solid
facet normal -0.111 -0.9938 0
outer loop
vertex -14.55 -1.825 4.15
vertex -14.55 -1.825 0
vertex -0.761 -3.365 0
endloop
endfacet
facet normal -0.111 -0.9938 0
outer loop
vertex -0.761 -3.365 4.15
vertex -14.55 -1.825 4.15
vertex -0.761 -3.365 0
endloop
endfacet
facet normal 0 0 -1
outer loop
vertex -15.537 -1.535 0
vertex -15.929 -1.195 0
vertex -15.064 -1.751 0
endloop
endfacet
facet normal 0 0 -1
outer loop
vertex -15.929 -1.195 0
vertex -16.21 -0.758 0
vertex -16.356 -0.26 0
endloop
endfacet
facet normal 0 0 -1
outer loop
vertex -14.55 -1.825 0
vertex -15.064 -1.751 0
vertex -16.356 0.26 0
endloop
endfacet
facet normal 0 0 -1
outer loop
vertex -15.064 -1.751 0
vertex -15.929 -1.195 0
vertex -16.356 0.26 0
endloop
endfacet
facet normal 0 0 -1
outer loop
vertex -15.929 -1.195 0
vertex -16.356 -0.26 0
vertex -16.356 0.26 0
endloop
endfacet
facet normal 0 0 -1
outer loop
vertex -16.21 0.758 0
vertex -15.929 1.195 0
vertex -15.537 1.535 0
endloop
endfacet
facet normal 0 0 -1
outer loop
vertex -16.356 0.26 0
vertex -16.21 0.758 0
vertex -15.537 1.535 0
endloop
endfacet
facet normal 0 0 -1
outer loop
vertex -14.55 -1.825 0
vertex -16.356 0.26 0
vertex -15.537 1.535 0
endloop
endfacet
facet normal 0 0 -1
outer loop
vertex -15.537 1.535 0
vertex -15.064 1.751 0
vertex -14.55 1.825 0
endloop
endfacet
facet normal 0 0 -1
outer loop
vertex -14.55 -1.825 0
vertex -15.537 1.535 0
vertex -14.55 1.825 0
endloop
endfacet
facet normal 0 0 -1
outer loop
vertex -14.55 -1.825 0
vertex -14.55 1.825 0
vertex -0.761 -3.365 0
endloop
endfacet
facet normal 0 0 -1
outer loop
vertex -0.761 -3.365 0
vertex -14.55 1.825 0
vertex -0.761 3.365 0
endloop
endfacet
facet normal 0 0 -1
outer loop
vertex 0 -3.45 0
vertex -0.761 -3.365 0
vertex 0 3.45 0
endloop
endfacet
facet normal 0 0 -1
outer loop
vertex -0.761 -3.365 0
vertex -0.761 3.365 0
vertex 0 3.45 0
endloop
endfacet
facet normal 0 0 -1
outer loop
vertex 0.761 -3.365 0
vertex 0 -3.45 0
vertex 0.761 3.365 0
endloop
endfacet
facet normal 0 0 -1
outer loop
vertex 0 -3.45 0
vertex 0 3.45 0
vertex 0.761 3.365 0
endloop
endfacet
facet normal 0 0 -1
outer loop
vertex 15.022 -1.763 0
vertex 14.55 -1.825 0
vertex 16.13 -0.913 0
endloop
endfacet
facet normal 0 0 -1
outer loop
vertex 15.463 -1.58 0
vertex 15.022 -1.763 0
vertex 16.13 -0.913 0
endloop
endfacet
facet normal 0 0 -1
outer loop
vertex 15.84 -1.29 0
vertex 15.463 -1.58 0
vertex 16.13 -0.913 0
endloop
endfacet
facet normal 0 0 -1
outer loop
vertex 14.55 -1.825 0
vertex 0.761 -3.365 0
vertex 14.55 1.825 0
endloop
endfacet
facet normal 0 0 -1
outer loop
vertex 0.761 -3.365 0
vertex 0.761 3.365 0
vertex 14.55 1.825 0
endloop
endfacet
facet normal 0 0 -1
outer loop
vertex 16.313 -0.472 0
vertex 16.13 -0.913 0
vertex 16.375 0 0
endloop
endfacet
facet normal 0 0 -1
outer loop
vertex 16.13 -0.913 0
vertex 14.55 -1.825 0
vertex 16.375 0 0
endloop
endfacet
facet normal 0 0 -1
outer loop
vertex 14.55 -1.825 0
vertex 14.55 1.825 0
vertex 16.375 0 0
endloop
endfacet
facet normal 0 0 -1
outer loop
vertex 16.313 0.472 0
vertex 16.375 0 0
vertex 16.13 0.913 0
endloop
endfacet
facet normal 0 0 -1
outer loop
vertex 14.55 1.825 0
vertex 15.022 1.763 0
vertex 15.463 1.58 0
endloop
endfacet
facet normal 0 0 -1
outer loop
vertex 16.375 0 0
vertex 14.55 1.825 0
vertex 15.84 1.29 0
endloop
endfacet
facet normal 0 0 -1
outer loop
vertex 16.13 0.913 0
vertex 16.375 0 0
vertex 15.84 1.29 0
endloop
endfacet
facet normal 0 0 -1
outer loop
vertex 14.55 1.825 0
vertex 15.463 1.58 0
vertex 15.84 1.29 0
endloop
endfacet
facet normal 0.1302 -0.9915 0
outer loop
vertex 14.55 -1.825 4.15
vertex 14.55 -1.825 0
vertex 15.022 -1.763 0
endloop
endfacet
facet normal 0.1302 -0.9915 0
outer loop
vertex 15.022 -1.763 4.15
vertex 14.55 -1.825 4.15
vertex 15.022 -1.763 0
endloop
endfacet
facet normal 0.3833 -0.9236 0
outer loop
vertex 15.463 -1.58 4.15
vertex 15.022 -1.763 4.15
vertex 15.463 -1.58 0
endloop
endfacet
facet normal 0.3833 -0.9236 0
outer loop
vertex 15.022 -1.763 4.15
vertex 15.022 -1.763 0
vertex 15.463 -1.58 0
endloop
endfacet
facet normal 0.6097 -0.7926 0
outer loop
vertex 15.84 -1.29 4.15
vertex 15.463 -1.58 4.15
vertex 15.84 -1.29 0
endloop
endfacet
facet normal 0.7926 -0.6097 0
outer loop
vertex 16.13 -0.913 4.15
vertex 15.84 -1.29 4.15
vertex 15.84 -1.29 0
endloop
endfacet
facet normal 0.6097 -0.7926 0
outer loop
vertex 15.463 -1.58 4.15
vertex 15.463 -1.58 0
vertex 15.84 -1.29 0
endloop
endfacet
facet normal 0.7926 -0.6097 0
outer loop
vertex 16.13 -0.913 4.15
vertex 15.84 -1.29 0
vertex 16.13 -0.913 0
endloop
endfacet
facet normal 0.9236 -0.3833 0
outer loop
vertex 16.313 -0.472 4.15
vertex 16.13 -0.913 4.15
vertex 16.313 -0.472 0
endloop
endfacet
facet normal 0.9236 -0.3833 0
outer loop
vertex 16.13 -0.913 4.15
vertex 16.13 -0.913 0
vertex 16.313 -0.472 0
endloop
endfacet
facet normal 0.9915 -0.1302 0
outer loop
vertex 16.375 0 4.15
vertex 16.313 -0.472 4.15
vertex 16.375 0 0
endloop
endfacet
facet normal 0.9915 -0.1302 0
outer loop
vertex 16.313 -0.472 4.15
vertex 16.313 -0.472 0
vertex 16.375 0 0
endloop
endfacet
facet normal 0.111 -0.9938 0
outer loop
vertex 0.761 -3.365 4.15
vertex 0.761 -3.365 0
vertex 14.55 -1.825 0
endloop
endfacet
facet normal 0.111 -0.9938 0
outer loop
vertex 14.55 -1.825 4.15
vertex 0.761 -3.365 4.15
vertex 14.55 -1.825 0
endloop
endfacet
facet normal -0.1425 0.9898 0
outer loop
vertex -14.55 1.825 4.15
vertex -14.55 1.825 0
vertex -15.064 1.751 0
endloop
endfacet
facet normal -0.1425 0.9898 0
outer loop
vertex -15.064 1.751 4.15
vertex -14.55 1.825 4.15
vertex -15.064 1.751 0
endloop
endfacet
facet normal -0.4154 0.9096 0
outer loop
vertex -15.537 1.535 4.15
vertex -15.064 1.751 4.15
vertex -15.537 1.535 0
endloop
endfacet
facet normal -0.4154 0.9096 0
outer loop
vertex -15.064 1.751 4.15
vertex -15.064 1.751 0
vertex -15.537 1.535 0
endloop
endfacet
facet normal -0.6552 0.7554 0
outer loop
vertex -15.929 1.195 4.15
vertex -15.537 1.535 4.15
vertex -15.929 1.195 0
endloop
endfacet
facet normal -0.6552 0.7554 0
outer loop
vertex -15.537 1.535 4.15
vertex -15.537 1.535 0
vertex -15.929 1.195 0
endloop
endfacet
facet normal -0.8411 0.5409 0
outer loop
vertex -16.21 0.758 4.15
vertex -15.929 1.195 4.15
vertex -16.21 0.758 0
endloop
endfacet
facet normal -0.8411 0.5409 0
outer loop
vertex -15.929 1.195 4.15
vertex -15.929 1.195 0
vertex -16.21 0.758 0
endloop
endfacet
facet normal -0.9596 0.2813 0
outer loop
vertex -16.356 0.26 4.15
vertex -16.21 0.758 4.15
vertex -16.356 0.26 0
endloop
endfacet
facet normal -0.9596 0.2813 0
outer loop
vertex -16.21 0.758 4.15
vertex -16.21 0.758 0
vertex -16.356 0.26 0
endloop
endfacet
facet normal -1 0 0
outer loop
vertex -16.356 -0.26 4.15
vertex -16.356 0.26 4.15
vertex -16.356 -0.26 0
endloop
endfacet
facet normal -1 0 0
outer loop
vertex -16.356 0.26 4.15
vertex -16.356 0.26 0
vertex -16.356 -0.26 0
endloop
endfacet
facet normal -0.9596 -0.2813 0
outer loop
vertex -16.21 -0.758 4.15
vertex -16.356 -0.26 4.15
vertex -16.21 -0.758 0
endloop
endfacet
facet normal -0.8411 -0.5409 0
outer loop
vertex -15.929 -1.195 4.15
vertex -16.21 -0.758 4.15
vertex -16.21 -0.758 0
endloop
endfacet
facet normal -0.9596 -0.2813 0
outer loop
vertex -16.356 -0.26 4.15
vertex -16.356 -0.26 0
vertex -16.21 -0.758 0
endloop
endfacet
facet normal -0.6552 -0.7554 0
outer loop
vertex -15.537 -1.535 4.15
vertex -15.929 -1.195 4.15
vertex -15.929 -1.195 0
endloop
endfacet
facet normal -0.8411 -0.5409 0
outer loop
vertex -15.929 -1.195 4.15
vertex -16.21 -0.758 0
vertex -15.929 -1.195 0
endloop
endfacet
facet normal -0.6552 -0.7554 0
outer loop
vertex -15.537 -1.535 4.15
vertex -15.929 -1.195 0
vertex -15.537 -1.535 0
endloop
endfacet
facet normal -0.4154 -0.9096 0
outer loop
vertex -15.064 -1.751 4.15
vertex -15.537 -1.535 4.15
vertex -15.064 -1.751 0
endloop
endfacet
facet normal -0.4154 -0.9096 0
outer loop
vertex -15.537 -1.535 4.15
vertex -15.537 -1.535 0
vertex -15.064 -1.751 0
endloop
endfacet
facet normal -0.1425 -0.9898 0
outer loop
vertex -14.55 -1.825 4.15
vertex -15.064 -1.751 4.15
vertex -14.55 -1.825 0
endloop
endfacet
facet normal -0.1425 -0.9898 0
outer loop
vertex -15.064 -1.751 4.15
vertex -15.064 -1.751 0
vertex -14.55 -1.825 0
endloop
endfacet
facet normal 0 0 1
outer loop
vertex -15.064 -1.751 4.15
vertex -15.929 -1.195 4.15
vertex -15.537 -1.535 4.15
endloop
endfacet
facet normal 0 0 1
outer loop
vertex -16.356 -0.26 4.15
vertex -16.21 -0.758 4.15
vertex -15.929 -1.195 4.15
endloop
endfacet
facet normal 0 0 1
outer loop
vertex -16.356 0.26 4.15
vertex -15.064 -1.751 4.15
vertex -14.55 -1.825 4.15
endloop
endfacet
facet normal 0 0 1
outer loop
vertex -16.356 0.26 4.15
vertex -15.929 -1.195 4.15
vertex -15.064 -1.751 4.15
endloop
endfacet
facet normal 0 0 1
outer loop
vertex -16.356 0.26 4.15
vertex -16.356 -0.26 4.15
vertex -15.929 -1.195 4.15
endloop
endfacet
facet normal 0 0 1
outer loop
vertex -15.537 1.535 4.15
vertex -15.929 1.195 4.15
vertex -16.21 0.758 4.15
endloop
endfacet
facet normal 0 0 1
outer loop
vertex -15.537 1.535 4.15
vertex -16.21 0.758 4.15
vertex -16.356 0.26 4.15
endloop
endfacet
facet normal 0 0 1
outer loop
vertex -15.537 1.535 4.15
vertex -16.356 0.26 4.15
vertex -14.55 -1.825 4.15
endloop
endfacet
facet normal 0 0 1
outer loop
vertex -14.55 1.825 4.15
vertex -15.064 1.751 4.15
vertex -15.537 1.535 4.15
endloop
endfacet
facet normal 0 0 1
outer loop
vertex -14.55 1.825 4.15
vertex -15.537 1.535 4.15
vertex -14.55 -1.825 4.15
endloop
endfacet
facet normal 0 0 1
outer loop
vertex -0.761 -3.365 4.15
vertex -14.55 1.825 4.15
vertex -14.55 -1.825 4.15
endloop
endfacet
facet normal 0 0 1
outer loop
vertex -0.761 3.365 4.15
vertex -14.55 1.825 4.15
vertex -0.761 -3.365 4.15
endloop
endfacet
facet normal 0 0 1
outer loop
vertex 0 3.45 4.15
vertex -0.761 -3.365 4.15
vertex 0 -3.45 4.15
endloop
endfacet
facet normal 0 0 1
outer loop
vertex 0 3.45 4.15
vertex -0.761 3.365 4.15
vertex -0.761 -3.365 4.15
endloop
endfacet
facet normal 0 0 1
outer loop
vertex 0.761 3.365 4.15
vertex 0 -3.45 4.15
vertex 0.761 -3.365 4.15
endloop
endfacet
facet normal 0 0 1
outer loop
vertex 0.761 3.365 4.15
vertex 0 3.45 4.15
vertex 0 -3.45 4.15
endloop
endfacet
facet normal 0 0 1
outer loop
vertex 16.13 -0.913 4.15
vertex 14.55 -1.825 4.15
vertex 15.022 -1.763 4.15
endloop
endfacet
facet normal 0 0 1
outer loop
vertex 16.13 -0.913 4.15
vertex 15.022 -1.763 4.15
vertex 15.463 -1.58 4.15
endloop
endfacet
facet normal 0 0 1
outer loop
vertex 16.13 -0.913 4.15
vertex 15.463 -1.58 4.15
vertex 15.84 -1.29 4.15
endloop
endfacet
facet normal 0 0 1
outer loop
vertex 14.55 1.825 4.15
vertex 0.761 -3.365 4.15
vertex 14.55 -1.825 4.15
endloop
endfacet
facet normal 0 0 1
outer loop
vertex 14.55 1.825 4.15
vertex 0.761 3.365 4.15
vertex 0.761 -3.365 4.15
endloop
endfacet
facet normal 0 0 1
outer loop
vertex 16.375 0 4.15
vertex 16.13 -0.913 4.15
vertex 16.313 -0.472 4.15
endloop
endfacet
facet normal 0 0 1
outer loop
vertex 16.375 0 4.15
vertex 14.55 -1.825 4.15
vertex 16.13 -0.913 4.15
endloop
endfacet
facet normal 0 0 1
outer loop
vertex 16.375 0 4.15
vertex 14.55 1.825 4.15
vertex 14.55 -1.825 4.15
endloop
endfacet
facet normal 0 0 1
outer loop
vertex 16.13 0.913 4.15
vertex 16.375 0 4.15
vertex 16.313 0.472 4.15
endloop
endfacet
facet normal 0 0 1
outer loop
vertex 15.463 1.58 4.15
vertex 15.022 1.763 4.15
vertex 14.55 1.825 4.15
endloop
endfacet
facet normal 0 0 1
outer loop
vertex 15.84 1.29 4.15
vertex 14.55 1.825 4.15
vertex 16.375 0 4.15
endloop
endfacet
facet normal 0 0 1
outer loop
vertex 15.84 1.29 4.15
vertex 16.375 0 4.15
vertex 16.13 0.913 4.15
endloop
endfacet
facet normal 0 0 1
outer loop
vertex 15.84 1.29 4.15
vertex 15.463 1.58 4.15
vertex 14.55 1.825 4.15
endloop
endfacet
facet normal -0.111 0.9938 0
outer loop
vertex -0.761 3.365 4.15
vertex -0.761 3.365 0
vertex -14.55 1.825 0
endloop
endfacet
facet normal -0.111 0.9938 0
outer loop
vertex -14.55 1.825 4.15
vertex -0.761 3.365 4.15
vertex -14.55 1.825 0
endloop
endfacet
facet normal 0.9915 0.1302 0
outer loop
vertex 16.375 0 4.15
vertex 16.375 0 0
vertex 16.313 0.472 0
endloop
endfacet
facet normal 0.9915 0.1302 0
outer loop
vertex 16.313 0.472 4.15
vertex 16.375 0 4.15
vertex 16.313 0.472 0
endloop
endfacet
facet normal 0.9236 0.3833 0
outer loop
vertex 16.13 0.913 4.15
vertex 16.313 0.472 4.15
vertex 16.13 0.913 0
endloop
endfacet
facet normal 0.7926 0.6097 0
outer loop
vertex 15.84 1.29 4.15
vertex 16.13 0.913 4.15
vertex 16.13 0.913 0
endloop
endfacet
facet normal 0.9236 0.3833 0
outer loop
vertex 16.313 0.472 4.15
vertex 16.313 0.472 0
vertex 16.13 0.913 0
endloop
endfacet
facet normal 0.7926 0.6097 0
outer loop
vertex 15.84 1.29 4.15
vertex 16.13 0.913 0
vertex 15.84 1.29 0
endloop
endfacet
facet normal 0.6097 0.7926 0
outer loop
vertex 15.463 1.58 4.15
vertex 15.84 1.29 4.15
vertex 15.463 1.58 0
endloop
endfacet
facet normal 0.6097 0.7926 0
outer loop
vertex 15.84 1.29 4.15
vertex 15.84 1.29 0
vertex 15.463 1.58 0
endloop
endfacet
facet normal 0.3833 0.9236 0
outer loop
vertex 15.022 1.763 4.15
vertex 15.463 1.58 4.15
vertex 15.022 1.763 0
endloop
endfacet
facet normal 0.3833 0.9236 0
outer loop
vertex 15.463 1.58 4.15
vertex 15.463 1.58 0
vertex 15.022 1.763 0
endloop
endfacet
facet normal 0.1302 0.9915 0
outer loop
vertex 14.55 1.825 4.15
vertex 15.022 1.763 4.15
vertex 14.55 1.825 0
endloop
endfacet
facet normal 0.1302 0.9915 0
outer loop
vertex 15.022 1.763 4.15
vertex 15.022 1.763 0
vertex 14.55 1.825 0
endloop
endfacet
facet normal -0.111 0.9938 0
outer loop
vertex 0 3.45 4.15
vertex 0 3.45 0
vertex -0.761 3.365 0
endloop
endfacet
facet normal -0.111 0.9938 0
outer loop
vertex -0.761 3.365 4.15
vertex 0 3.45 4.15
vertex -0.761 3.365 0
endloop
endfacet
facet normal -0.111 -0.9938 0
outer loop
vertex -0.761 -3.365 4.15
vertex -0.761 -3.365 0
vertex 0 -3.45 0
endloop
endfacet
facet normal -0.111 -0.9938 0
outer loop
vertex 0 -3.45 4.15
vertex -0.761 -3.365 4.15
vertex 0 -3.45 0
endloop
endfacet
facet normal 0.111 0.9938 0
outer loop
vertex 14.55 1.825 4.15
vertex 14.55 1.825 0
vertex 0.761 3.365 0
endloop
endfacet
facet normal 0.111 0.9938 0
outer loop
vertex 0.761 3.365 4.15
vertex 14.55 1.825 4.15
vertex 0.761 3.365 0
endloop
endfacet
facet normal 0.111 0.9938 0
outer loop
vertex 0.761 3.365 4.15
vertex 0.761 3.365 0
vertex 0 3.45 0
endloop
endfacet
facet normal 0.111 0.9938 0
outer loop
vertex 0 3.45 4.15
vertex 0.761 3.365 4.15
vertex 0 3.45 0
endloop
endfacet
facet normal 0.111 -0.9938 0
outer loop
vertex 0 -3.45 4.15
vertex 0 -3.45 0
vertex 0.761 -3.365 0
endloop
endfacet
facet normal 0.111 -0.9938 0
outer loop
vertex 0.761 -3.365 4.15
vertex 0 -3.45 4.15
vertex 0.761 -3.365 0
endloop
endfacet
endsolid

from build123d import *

# Parameters (mm, degrees)
F2_DEPTH = 4.15


with BuildPart() as f2:
    # F1 (on Top) → F2 (new body)
    with BuildSketch(Plane.XY):
        with BuildLine():
            ThreePointArc((-0.761124832, -3.3649946494), (-3.45, 0), (-0.761124832, 3.3649946494))
            Line((-0.761124832, 3.3649946494), (-14.55, 1.825))
            ThreePointArc((-14.55, 1.825), (-13.2595301243, 1.2904698757), (-12.725, 0))
            ThreePointArc((-12.725, 0), (-13.2595301243, -1.2904698757), (-14.55, -1.825))
            Line((-14.55, -1.825), (-0.761124832, -3.3649946494))
        make_face()
        with BuildLine():
            ThreePointArc((-12.725, 0), (-13.2595301243, 1.2904698757), (-14.55, 1.825))
            ThreePointArc((-14.55, 1.825), (-16.375, 0), (-14.55, -1.825))
            ThreePointArc((-14.55, -1.825), (-13.2595301243, -1.2904698757), (-12.725, 0))
        make_face()
        with BuildLine():
            ThreePointArc((0.761124832, -3.3649946494), (2.6952161945, -2.1536735279), (3.45, 0))
            ThreePointArc((3.45, 0), (2.6952161945, 2.1536735279), (0.761124832, 3.3649946494))
            Line((0.761124832, 3.3649946494), (0, 3.45))
            Line((0, 3.45), (-0.761124832, 3.3649946494))
            ThreePointArc((-0.761124832, 3.3649946494), (-3.45, 0), (-0.761124832, -3.3649946494))
            Line((-0.761124832, -3.3649946494), (0, -3.45))
            Line((0, -3.45), (0.761124832, -3.3649946494))
        make_face()
        with BuildLine():
            ThreePointArc((0.761124832, 3.3649946494), (2.6952161945, 2.1536735279), (3.45, 0))
            ThreePointArc((3.45, 0), (2.6952161945, -2.1536735279), (0.761124832, -3.3649946494))
            Line((0.761124832, -3.3649946494), (14.55, -1.825))
            ThreePointArc((14.55, -1.825), (12.725, 0), (14.55, 1.825))
            Line((14.55, 1.825), (0.761124832, 3.3649946494))
        make_face()
        with BuildLine():
            ThreePointArc((16.375, 0), (15.8404698757, 1.2904698757), (14.55, 1.825))
            ThreePointArc((14.55, 1.825), (12.725, 0), (14.55, -1.825))
            ThreePointArc((14.55, -1.825), (15.8404698757, -1.2904698757), (16.375, 0))
        make_face()
    extrude(amount=F2_DEPTH)


solid = f2.part
